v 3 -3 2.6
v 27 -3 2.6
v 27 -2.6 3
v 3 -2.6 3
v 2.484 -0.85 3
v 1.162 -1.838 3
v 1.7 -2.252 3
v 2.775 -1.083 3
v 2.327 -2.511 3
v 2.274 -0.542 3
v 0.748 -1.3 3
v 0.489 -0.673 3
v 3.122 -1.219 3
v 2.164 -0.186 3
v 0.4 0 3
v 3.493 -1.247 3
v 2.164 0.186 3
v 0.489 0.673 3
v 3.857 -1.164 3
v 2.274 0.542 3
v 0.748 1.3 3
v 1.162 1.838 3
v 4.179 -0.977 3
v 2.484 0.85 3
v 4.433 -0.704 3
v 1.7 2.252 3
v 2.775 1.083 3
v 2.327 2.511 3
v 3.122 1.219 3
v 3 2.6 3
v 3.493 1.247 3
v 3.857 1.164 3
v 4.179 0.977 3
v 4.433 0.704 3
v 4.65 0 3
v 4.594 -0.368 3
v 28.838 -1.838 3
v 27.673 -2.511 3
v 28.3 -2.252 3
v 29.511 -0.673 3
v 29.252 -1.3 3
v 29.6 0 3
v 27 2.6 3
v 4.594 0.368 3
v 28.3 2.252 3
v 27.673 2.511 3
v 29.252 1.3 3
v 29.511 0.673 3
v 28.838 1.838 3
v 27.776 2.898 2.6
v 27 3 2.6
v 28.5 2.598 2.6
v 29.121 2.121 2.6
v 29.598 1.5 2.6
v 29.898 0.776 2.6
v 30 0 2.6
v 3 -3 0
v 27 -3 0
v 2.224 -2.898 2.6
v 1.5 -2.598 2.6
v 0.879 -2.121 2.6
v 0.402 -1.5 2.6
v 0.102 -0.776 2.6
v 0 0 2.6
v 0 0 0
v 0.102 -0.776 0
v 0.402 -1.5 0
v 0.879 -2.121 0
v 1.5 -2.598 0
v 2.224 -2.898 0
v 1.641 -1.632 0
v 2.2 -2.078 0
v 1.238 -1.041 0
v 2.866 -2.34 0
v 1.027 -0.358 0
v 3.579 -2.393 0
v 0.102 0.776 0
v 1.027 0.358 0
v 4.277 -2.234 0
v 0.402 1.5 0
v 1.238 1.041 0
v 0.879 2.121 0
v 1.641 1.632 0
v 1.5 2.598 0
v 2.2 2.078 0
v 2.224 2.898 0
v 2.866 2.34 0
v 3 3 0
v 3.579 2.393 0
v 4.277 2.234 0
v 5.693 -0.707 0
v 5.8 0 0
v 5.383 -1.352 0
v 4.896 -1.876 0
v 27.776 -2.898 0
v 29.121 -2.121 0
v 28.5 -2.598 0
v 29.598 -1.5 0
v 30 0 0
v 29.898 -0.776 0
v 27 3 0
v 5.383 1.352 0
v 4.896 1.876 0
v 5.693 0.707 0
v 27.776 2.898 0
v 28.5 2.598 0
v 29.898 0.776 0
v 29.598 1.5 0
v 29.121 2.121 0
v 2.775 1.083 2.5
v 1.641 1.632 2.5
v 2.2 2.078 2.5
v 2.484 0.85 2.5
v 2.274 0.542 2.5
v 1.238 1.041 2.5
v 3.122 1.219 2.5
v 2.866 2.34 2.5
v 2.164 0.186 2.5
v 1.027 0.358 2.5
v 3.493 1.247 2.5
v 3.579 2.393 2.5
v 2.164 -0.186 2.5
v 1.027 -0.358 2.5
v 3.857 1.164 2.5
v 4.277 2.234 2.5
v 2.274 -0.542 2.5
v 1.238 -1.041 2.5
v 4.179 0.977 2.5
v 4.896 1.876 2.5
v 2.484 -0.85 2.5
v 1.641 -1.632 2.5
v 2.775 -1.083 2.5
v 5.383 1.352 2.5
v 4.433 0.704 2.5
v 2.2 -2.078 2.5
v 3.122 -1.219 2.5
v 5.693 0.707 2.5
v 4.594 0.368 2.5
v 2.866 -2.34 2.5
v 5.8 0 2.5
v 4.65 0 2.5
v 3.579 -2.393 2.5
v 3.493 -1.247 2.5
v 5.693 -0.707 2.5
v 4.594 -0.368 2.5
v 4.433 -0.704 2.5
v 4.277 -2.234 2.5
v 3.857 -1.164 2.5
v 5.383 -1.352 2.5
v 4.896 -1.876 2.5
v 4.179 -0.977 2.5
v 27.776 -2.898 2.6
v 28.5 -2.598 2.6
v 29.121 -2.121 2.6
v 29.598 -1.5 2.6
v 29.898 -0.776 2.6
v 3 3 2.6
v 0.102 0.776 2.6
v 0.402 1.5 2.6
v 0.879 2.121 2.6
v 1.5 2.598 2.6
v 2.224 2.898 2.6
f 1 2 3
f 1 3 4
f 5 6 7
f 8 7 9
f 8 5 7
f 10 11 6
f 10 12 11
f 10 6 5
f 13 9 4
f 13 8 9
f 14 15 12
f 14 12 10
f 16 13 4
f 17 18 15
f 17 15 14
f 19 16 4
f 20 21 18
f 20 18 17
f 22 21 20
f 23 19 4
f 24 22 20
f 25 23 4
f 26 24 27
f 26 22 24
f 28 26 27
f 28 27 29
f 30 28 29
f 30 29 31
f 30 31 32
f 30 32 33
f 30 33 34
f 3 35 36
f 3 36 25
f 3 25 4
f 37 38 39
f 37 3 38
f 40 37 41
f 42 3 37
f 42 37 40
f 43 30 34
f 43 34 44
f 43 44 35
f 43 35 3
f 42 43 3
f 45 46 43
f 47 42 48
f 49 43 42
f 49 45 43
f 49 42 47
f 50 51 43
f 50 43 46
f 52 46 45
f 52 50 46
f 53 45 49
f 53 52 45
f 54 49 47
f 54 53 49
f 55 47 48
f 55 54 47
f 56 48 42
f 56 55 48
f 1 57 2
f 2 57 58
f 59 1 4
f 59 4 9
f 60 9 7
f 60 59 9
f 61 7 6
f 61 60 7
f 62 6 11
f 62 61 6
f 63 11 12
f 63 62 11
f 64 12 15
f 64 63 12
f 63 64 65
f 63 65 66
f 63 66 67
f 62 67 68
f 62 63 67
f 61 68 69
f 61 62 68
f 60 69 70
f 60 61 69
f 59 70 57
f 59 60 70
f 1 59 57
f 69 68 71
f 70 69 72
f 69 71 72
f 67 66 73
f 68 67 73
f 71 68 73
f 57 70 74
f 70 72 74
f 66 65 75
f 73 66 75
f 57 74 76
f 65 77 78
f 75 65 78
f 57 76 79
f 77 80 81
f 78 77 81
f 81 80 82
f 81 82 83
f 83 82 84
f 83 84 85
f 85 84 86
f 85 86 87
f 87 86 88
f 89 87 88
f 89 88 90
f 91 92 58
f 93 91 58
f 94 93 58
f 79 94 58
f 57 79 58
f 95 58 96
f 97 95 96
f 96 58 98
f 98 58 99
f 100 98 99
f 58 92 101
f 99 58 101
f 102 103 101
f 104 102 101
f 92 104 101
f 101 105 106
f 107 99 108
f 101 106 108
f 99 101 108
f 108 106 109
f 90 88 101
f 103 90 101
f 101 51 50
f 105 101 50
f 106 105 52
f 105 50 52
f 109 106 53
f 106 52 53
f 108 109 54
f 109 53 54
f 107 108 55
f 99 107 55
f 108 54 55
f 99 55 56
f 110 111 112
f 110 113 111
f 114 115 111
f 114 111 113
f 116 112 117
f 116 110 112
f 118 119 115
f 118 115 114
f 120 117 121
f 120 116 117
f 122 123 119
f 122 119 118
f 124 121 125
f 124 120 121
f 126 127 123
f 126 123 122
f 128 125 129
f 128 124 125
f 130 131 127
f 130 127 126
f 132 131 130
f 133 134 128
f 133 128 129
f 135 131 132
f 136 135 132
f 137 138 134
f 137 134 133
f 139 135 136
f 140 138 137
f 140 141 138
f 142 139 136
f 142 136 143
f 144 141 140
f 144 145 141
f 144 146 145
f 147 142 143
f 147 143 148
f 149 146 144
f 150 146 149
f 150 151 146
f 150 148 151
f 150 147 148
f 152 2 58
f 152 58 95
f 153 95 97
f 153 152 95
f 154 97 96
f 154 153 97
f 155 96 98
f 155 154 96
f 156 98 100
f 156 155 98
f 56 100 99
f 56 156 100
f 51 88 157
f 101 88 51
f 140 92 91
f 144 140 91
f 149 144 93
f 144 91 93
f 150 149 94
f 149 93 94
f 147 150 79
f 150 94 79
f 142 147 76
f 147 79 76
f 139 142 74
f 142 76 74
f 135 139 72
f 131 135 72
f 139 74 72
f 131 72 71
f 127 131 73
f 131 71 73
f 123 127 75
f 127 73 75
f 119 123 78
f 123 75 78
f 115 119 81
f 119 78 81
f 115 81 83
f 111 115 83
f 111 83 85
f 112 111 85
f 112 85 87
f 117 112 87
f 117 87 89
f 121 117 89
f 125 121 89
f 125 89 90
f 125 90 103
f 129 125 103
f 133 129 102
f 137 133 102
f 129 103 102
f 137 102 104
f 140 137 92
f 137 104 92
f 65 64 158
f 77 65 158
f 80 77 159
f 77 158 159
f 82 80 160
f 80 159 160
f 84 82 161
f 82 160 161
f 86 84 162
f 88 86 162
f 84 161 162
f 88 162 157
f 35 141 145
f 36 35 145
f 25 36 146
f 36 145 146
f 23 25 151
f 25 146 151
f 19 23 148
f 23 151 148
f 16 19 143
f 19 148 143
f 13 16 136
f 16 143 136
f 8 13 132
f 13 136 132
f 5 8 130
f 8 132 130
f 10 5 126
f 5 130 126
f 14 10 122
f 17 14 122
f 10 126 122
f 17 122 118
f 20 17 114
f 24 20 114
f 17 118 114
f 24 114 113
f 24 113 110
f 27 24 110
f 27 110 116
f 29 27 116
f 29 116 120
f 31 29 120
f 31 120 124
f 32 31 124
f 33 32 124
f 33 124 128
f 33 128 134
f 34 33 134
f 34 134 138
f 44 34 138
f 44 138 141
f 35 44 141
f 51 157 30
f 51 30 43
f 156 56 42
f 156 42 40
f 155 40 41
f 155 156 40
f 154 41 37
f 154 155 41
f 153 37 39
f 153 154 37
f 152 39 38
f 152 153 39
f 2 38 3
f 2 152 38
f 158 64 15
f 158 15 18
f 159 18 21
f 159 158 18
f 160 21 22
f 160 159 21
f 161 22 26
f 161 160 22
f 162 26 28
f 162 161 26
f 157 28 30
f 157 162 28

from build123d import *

# Parameters (mm, degrees)
F0_W     = 30
F0_H     = 6
F1_DEPTH = 3
F2_R     = 2.4
F2_R_2   = 1.25
F3_DEPTH = 2.5
F4_DEPTH = 3.001
F5_R     = 2.99999
F6_SIZE  = 0.4


# Not quite as in the source:
# - a fillet or chamfer is up to 0.001 mm smaller than in the source, because OpenCascade refuses the exact size


with BuildPart() as f1:
    # F0 (on Top) → F1 (new body)
    with BuildSketch(Plane.XY):
        with Locations((15, 0)):
            Rectangle(F0_W, F0_H)
    extrude(amount=F1_DEPTH)

    # F2 (on face) → F3 (cut)
    with BuildSketch(Plane(origin=(0, 0, 0), x_dir=(1, 0, 0), z_dir=(0, 0, -1))):
        with Locations((3.4, 0)):
            Circle(F2_R)
        with Locations((3.4, 0)):
            Circle(F2_R_2, mode=Mode.SUBTRACT)
        with Locations((3.4, 0)):
            Circle(F2_R_2)
    extrude(amount=-F3_DEPTH, mode=Mode.SUBTRACT)

    # F2 (on face) → F4 (cut, through all)
    with BuildSketch(Plane(origin=(0, 0, 0), x_dir=(1, 0, 0), z_dir=(0, 0, -1))):
        with Locations((3.4, 0)):
            Circle(F2_R_2)
    extrude(amount=-F4_DEPTH, mode=Mode.SUBTRACT)

    # F5 (radius 3 in the source; OpenCascade refuses exactly that, so slightly less here)
    f5_edges = [f1.edges().sort_by_distance(p)[0] for p in [
        (0, -3, 1.5),
        (0, 3, 1.5),
        (30, -3, 1.5),
        (30, 3, 1.5),
    ]]
    fillet(f5_edges, radius=F5_R)

    # F6
    f6_edges = [f1.edges().sort_by_distance(p)[0] for p in [
        (15, 3, 3),
    ]]
    chamfer(f6_edges, length=F6_SIZE)


solid = f1.part
